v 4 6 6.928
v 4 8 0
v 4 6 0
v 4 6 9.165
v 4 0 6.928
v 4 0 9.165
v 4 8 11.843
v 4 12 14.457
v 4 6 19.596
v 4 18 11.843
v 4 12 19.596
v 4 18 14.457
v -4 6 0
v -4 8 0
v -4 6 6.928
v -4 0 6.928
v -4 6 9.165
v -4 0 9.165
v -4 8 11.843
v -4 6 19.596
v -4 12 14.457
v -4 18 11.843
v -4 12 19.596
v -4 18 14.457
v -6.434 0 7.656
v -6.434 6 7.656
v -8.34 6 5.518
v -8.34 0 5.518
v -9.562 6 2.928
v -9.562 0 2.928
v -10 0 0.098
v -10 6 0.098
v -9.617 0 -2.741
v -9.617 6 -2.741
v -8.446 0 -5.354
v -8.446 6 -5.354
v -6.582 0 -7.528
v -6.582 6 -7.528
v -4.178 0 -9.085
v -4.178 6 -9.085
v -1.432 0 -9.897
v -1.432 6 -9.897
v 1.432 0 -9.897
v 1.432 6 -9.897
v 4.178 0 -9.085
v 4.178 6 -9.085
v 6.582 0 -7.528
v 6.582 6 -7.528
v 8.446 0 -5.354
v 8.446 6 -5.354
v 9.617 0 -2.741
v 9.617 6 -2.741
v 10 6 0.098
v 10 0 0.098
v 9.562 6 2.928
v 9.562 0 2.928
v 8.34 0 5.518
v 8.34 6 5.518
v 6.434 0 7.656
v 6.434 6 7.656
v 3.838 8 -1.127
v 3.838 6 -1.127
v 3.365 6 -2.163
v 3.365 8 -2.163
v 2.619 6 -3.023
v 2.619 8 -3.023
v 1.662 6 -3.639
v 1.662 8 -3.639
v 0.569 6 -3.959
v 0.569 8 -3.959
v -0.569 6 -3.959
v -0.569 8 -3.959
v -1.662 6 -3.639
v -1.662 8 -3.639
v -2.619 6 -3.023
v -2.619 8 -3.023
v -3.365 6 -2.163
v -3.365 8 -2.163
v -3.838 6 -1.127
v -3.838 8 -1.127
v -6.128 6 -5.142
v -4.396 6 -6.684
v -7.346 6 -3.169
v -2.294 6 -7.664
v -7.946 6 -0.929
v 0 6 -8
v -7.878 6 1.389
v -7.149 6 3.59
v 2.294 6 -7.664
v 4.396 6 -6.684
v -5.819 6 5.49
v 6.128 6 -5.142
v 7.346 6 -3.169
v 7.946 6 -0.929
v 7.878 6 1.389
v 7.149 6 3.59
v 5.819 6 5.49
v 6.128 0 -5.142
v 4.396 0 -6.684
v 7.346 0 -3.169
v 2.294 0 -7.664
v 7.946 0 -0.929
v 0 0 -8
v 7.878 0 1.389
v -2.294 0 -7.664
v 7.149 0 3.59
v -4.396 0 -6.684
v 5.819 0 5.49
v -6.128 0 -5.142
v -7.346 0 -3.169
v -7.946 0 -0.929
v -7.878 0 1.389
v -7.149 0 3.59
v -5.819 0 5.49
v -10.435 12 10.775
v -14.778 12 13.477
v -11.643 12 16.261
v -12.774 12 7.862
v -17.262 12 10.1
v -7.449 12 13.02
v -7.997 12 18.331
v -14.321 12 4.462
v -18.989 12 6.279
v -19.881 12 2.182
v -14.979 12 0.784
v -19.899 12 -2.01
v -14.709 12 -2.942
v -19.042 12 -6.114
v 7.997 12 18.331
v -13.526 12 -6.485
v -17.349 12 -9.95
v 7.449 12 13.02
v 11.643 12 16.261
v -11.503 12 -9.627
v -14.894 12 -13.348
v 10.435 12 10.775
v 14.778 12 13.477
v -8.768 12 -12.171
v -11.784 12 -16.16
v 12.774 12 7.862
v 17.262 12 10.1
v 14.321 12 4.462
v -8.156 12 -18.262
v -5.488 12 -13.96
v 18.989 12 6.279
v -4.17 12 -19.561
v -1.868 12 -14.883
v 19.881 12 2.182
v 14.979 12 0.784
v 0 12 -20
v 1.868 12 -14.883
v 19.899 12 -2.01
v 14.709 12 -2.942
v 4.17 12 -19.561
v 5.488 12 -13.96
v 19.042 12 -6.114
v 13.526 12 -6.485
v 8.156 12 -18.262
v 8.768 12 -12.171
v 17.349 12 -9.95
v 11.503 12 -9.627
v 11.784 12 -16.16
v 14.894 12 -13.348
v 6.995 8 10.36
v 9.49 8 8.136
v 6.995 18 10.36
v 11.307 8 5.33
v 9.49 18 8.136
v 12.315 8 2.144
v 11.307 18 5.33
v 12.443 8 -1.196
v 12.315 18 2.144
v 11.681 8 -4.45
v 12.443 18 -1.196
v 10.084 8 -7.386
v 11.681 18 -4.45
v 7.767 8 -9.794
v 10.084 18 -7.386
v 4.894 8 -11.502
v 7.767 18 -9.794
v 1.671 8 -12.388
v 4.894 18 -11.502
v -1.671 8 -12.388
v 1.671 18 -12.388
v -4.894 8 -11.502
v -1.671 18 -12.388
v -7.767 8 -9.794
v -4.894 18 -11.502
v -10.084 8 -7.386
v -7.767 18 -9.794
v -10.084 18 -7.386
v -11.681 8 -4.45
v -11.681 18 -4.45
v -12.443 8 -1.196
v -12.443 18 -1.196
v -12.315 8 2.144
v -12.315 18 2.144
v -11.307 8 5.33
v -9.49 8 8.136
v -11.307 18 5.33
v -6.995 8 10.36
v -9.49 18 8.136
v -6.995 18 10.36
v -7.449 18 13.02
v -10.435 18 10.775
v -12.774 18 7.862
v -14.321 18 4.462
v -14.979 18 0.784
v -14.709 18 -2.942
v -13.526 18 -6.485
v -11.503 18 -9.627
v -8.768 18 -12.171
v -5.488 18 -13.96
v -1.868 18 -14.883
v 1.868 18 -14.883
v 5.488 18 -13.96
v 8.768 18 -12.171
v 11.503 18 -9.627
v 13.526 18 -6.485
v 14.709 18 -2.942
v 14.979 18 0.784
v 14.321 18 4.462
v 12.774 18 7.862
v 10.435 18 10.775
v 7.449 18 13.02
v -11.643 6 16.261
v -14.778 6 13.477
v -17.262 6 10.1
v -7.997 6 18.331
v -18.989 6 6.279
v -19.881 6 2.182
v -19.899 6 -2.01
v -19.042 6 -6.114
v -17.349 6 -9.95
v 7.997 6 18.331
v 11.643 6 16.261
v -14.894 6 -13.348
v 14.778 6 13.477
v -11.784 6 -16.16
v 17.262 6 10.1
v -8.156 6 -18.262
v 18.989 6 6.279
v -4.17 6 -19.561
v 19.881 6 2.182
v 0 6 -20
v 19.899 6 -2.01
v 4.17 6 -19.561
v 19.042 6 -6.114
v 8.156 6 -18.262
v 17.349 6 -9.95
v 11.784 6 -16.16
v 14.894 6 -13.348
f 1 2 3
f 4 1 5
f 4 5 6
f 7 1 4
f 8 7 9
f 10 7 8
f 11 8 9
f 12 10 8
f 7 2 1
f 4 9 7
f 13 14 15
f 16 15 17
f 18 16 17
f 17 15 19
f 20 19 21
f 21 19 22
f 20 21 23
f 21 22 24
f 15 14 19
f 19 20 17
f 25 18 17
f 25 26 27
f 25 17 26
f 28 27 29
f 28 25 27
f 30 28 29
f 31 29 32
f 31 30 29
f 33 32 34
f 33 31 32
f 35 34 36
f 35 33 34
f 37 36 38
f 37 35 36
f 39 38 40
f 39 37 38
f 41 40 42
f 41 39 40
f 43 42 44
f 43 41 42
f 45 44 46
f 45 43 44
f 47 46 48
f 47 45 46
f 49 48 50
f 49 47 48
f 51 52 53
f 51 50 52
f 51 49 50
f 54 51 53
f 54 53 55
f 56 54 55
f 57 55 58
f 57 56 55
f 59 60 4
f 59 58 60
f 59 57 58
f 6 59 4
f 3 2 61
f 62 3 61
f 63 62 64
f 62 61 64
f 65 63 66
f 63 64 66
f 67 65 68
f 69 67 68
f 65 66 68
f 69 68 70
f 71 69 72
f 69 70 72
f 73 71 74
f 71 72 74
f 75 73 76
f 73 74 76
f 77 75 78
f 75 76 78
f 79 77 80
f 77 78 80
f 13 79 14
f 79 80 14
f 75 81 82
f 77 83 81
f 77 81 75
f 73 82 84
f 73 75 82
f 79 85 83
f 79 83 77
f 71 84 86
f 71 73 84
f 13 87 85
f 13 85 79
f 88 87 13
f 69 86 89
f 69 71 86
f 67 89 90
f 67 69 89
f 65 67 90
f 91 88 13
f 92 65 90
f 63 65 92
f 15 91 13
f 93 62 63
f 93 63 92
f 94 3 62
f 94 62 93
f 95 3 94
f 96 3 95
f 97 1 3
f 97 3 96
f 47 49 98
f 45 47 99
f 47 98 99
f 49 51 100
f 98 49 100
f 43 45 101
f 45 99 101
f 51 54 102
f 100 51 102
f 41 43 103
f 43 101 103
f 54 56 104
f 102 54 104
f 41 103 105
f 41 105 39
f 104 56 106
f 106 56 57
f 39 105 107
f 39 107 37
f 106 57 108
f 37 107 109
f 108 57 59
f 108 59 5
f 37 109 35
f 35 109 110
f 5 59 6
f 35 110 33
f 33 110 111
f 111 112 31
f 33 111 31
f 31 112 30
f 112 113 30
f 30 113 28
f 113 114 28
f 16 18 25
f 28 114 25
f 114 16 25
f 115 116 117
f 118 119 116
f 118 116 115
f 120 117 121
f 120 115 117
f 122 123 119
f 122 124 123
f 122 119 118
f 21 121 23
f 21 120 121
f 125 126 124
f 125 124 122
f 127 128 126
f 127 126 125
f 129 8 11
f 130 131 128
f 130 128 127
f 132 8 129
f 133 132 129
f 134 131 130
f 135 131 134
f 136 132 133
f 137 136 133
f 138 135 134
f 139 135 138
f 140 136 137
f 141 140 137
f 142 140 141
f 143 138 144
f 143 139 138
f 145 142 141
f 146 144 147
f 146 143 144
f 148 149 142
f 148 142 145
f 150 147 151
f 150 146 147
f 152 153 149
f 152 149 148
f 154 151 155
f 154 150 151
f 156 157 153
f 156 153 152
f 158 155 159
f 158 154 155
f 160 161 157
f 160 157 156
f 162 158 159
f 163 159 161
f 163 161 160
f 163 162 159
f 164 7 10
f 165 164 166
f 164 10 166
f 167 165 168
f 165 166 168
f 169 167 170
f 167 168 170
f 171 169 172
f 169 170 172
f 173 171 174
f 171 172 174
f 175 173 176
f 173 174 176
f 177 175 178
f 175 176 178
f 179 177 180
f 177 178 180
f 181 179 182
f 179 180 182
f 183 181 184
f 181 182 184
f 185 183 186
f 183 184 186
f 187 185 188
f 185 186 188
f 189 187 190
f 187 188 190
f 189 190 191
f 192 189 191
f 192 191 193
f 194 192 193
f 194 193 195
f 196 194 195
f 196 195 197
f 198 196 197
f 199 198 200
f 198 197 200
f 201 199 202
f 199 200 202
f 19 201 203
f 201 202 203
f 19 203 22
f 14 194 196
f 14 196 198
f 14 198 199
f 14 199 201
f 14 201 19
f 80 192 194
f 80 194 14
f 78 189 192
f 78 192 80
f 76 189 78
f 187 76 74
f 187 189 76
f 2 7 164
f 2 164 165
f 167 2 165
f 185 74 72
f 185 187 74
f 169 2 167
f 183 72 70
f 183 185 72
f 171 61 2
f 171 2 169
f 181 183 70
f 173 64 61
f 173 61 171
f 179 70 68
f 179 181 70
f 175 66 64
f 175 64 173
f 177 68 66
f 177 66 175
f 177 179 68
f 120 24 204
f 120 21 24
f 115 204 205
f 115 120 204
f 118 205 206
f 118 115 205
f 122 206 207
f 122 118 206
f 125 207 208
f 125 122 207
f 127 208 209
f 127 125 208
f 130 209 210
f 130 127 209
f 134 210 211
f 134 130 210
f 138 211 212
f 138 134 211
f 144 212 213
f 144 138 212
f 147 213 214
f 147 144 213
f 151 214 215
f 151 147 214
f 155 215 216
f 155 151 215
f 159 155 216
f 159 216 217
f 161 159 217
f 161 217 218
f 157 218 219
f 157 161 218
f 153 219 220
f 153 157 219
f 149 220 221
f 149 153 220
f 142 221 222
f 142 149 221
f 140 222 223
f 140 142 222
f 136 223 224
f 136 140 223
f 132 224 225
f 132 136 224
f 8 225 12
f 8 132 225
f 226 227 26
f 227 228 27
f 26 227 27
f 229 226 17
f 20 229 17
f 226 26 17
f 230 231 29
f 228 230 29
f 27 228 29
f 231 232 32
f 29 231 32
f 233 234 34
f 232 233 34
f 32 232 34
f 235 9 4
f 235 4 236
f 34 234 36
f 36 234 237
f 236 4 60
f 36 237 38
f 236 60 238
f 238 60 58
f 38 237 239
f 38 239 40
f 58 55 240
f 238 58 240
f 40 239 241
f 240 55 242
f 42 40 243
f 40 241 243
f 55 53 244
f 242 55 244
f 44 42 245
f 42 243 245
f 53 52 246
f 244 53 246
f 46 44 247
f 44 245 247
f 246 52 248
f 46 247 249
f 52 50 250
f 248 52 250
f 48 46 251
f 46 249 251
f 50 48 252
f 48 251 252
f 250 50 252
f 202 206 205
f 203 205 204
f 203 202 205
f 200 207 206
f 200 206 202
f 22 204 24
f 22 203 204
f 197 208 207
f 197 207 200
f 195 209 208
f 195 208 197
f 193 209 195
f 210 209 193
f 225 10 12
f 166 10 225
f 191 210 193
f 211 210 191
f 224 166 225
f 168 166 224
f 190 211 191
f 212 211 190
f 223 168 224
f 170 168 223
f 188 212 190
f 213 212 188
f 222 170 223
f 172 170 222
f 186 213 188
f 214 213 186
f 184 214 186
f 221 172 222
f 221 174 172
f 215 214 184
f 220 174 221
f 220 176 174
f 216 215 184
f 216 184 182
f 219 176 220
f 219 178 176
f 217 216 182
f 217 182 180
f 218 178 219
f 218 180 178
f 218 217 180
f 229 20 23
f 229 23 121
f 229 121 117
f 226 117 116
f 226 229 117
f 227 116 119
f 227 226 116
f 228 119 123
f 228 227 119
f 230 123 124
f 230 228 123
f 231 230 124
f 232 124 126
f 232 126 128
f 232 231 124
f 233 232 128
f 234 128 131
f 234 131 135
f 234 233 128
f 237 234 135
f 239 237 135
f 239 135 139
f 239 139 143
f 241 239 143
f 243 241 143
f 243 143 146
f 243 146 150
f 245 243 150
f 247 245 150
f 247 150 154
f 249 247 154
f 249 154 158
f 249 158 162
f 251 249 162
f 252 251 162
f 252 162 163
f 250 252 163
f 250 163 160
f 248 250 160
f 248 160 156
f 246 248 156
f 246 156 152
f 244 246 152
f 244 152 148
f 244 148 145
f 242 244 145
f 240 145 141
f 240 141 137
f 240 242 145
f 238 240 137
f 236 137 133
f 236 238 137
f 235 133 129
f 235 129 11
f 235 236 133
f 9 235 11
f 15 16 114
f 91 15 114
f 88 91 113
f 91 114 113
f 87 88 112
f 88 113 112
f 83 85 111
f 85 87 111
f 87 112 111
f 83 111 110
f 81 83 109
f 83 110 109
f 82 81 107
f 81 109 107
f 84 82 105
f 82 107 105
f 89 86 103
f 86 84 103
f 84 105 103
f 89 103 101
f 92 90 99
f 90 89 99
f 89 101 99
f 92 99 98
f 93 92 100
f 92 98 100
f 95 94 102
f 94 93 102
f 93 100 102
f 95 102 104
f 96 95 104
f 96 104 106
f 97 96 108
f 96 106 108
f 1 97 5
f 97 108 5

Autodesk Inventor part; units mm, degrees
ref_plane "YZ Plane" through (0, 0, 0) normal (1, 0, 0) x (0, 1, 0)
ref_plane "XZ Plane" through (0, 0, 0) normal (0, 1, 0) x (-1, 0, 0)
ref_plane "XY Plane" through (0, 0, 0) normal (0, 0, 1) x (1, 0, 0)
sketch "Boceto1" plane through (0, 0, 0) normal (0, 1, 0) x (-1, 0, 0)
  circle A0 centre (0, 0) radius 10
  dimension "d3" = 20
extrude "Extrusión1" add sketch "Boceto1" along normal blind 6
sketch "Boceto2" plane through (0, 6, 0) normal (0, 1, 0) x (1, 0, 0)
  circle A0 centre (0, 0) radius 20
  dimension "d6" = 40
extrude "Extrusión2" add sketch "Boceto2" along normal blind 6
sketch "Boceto3" plane through (0, 12, 0) normal (0, 1, 0) x (1, 0, 0)
  circle A0 centre (0, 0) radius 15
  dimension "d9" = 30
extrude "Extrusión3" add sketch "Boceto3" along normal blind 6
sketch "Boceto4" plane through (0, 18, 0) normal (0, 1, 0) x (1, 0, 0)
  circle A0 centre (0, 0) radius 4
  circle A1 centre (0, 0) radius 20 projected
  line L0 (-4, 0) -> (-4, -19.5959)
  line L1 (4, 0) -> (4, -19.5959)
  dimension "d12" = 8
extrude "Extrusión4" cut sketch "Boceto4" against normal through all contours A0 | L1 A1 L0 A0 picked at (0.1607, -14.6269)
sketch "Boceto5" plane through (0, 18, 0) normal (0, 1, 0) x (1, 0, 0)
  circle A0 centre (0, 0) radius 12.5
  dimension "d15" = 25
extrude "Extrusión5" cut sketch "Boceto5" against normal blind 10
sketch "Boceto6" plane through (0, 0, 0) normal (0, -1, 0) x (1, 0, 0)
  circle A0 centre (0, 0) radius 8
  dimension "d18" = 16
extrude "Extrusión6" cut sketch "Boceto6" against normal up to surface (6 mm away)
properties part number "shocks_end" material "Goma"
